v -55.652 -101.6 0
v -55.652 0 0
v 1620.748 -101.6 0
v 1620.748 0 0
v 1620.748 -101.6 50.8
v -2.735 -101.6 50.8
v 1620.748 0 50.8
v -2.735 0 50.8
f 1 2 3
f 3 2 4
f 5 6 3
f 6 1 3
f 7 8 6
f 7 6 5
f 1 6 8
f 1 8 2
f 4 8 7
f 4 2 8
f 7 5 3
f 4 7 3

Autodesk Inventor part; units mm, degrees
ref_plane "YZ Plane" through (0, 0, 0) normal (1, 0, 0) x (0, 1, 0)
ref_plane "XZ Plane" through (0, 0, 0) normal (0, 1, 0) x (-1, 0, 0)
ref_plane "XY Plane" through (0, 0, 0) normal (0, 0, 1) x (1, 0, 0)
ref_plane "Work Plane1" through (0, 0, 0) normal (0, 0, 1) x (1, 0, 0)
sketch "Sketch1" plane through (0, 0, 0) normal (0, 0, 1) x (1, 0, 0)
  line L0 (-55.6518, 0) -> (0, 0) projected
  line L1 (-55.6518, 0) -> (-55.6518, -101.6) projected
  line L2 (0, -101.6) -> (-55.6518, -101.6) projected
  line L3 (0, 0) -> (0, -101.6) projected
  line L4 (1549.4, -50.8) -> (1651, -50.8) projected
  line L5 (1651, -50.8) -> (1651, 0) projected
  line L6 (1549.4, 0) -> (1651, 0) projected
  line L7 (1549.4, -50.8) -> (1549.4, 0) projected
  line L8 (-55.6518, -101.6) -> (1600.2, -101.6)
  line L9 (1600.2, -101.6) -> (1600.2, 0)
  line L10 (1600.2, 0) -> (-55.6518, 0)
  line L11 (-55.6518, 0) -> (-55.6518, -101.6)
  point P0 (0, 0)
extrude "Extrusion1" add sketch "Sketch1" along normal blind 50.8 contours L0 L3 L2 L1 | L10 L7 L4 L9 L8 L3 | L6 L9 L4 L7
sketch "Sketch3" plane through (-55.6518, -101.6, 0) normal (0, -1, 0) x (1, 0, 0)
  line L0 (0, 0) -> (101.6, 0) projected
  line L1 (101.6, 0) -> (1270, 1117.6) projected
  line L2 (1270, 1117.6) -> (1270, 1219.2) projected
  line L3 (1270, 1219.2) -> (0, 0) projected
  line L4 (0, 0) -> (101.6, 0) projected
  line L5 (101.6, 0) -> (1270, 1117.6) projected
  line L6 (1270, 1117.6) -> (1270, 1219.2) projected
  line L7 (1270, 1219.2) -> (0, 0) projected
  line L8 (0, 0) -> (0, 50.8) projected
  line L9 (0, 0) -> (0, 50.8)
  line L10 (0, 50.8) -> (52.9167, 50.8)
  line L11 (0, 50.8) -> (1655.8518, 50.8) projected
  line L12 (0, 0) -> (1655.8518, 0) projected
  line L13 (52.9167, 50.8) -> (0, 0)
  point P0 (55.6518, 0)
  point P1 (52.9167, 50.8)
extrude "Extrusion3" cut sketch "Sketch3" against normal blind 101.6 contours L8 L10 L3
ref_plane "Work Plane2" through (1620.7482, -50.8, -965.2) normal (0, 1, 0) x (0, 0, -1)
sketch "Sketch4" plane through (1600.2, 0, 50.8) normal (0, 1, 0) x (1, 0, 0)
  line L0 (-30.2518, 1981.2) -> (-30.2518, 50.8) projected
  line L1 (-30.2518, 50.8) -> (71.3482, 50.8) projected
  line L2 (71.3482, 50.8) -> (71.3482, 1981.2) projected
  line L3 (71.3482, 1981.2) -> (-30.2518, 1981.2) projected
  line L4 (-30.2518, 1981.2) -> (-30.2518, 50.8) projected
  line L5 (-30.2518, 50.8) -> (71.3482, 50.8) projected
  line L6 (71.3482, 50.8) -> (71.3482, 1981.2) projected
  line L7 (71.3482, 1981.2) -> (-30.2518, 1981.2) projected
  line L8 (20.5482, 50.8) -> (0, 50.8)
  line L9 (-1602.9352, 0) -> (0, 0) projected
  line L10 (0, 50.8) -> (0, 0)
  line L11 (0, 0) -> (20.5482, 0)
  line L12 (20.5482, 0) -> (20.5482, 50.8)
  point P0 (-1600.2, 50.8)
  point P1 (20.5482, 50.8)
extrude "Extrusion4" add sketch "Sketch4" against normal blind 101.6 contours L1 L12 L11 L10
properties part number "2X4X65.191" material "Wood (Birch)"
